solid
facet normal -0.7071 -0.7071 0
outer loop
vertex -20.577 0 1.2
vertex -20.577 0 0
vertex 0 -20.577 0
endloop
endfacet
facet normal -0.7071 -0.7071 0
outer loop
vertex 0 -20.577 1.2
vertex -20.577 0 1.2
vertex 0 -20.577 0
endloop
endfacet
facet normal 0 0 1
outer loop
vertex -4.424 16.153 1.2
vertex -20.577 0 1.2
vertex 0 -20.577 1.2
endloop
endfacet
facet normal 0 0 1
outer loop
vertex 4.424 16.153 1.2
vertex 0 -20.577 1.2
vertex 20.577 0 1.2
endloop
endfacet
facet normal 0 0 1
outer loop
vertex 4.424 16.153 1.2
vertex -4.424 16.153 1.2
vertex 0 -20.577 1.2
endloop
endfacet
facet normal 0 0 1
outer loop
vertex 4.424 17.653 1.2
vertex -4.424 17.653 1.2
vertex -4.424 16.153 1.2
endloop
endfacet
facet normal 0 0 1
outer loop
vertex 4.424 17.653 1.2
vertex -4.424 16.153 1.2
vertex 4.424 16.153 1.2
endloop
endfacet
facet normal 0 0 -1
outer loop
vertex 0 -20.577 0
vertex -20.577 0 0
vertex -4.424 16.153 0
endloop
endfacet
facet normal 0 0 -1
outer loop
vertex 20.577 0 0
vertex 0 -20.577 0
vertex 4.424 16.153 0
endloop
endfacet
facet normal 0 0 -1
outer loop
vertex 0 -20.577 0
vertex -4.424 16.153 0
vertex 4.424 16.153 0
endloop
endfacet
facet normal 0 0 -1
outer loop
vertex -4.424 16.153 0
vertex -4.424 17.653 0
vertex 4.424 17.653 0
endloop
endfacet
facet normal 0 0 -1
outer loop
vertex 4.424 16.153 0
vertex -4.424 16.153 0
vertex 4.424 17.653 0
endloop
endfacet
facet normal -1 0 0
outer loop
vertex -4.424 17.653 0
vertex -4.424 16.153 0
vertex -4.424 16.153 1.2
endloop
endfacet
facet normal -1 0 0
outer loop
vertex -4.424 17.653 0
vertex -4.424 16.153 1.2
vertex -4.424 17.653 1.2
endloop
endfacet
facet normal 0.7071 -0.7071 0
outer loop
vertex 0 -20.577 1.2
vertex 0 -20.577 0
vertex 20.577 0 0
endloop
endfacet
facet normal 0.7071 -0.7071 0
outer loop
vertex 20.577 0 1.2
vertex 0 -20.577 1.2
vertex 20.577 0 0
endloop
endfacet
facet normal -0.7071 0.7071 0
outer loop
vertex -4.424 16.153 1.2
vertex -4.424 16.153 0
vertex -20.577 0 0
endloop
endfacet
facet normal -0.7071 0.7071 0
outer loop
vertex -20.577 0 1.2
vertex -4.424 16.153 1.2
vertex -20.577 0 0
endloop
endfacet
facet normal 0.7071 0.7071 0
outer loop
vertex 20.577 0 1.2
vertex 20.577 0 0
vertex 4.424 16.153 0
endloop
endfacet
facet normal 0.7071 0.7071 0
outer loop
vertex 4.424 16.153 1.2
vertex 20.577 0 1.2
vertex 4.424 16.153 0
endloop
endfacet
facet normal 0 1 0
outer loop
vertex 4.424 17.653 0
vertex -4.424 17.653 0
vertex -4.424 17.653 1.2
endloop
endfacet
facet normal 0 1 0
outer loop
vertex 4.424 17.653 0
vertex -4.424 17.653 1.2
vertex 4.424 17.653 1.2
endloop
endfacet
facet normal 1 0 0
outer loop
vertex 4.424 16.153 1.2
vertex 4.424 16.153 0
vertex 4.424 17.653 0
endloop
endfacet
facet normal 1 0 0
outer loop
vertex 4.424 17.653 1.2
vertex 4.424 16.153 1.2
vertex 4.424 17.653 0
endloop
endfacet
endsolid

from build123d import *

# Parameters (mm, degrees)
BOSS_EXTRUDE1_DEPTH = 1.2
SKETCH2_W           = 8.848528138
SKETCH2_H           = 1.5
BOSS_EXTRUDE2_DEPTH = 1.2


with BuildPart() as part:
    # Sketch1 → Boss-Extrude1 (new body)
    with BuildSketch(Plane.XY):
        Polygon((4, 16.152543264), (-4, 16.152543264), (-20.152543264, 0), (0, -20.152543264), (20.152543264, 0), align=None)
        Polygon((-4.424264069, 16.152543264), (-4.624264069, 15.952543264), (-4.482842712, 15.952543264), (-20.435385976, 0), (0, -20.435385976), (20.435385976, 0), (4.482842712, 15.952543264), (4.624264069, 15.952543264), (4.424264069, 16.152543264), (4, 16.152543264), (20.152543264, 0), (0, -20.152543264), (-20.152543264, 0), (-4, 16.152543264), align=None)
        Polygon((-20.435385976, 0), (-4.482842712, 15.952543264), (-4.624264069, 15.952543264), (-20.576807333, 0), (0, -20.576807333), (20.576807333, 0), (4.624264069, 15.952543264), (4.482842712, 15.952543264), (20.435385976, 0), (0, -20.435385976), align=None)
    extrude(amount=BOSS_EXTRUDE1_DEPTH)

    # Sketch2 → Boss-Extrude2 (add)
    with BuildSketch(Plane.XY):
        with Locations((0, 16.902543264)):
            Rectangle(SKETCH2_W, SKETCH2_H)
    extrude(amount=BOSS_EXTRUDE2_DEPTH)


solid = part.part
